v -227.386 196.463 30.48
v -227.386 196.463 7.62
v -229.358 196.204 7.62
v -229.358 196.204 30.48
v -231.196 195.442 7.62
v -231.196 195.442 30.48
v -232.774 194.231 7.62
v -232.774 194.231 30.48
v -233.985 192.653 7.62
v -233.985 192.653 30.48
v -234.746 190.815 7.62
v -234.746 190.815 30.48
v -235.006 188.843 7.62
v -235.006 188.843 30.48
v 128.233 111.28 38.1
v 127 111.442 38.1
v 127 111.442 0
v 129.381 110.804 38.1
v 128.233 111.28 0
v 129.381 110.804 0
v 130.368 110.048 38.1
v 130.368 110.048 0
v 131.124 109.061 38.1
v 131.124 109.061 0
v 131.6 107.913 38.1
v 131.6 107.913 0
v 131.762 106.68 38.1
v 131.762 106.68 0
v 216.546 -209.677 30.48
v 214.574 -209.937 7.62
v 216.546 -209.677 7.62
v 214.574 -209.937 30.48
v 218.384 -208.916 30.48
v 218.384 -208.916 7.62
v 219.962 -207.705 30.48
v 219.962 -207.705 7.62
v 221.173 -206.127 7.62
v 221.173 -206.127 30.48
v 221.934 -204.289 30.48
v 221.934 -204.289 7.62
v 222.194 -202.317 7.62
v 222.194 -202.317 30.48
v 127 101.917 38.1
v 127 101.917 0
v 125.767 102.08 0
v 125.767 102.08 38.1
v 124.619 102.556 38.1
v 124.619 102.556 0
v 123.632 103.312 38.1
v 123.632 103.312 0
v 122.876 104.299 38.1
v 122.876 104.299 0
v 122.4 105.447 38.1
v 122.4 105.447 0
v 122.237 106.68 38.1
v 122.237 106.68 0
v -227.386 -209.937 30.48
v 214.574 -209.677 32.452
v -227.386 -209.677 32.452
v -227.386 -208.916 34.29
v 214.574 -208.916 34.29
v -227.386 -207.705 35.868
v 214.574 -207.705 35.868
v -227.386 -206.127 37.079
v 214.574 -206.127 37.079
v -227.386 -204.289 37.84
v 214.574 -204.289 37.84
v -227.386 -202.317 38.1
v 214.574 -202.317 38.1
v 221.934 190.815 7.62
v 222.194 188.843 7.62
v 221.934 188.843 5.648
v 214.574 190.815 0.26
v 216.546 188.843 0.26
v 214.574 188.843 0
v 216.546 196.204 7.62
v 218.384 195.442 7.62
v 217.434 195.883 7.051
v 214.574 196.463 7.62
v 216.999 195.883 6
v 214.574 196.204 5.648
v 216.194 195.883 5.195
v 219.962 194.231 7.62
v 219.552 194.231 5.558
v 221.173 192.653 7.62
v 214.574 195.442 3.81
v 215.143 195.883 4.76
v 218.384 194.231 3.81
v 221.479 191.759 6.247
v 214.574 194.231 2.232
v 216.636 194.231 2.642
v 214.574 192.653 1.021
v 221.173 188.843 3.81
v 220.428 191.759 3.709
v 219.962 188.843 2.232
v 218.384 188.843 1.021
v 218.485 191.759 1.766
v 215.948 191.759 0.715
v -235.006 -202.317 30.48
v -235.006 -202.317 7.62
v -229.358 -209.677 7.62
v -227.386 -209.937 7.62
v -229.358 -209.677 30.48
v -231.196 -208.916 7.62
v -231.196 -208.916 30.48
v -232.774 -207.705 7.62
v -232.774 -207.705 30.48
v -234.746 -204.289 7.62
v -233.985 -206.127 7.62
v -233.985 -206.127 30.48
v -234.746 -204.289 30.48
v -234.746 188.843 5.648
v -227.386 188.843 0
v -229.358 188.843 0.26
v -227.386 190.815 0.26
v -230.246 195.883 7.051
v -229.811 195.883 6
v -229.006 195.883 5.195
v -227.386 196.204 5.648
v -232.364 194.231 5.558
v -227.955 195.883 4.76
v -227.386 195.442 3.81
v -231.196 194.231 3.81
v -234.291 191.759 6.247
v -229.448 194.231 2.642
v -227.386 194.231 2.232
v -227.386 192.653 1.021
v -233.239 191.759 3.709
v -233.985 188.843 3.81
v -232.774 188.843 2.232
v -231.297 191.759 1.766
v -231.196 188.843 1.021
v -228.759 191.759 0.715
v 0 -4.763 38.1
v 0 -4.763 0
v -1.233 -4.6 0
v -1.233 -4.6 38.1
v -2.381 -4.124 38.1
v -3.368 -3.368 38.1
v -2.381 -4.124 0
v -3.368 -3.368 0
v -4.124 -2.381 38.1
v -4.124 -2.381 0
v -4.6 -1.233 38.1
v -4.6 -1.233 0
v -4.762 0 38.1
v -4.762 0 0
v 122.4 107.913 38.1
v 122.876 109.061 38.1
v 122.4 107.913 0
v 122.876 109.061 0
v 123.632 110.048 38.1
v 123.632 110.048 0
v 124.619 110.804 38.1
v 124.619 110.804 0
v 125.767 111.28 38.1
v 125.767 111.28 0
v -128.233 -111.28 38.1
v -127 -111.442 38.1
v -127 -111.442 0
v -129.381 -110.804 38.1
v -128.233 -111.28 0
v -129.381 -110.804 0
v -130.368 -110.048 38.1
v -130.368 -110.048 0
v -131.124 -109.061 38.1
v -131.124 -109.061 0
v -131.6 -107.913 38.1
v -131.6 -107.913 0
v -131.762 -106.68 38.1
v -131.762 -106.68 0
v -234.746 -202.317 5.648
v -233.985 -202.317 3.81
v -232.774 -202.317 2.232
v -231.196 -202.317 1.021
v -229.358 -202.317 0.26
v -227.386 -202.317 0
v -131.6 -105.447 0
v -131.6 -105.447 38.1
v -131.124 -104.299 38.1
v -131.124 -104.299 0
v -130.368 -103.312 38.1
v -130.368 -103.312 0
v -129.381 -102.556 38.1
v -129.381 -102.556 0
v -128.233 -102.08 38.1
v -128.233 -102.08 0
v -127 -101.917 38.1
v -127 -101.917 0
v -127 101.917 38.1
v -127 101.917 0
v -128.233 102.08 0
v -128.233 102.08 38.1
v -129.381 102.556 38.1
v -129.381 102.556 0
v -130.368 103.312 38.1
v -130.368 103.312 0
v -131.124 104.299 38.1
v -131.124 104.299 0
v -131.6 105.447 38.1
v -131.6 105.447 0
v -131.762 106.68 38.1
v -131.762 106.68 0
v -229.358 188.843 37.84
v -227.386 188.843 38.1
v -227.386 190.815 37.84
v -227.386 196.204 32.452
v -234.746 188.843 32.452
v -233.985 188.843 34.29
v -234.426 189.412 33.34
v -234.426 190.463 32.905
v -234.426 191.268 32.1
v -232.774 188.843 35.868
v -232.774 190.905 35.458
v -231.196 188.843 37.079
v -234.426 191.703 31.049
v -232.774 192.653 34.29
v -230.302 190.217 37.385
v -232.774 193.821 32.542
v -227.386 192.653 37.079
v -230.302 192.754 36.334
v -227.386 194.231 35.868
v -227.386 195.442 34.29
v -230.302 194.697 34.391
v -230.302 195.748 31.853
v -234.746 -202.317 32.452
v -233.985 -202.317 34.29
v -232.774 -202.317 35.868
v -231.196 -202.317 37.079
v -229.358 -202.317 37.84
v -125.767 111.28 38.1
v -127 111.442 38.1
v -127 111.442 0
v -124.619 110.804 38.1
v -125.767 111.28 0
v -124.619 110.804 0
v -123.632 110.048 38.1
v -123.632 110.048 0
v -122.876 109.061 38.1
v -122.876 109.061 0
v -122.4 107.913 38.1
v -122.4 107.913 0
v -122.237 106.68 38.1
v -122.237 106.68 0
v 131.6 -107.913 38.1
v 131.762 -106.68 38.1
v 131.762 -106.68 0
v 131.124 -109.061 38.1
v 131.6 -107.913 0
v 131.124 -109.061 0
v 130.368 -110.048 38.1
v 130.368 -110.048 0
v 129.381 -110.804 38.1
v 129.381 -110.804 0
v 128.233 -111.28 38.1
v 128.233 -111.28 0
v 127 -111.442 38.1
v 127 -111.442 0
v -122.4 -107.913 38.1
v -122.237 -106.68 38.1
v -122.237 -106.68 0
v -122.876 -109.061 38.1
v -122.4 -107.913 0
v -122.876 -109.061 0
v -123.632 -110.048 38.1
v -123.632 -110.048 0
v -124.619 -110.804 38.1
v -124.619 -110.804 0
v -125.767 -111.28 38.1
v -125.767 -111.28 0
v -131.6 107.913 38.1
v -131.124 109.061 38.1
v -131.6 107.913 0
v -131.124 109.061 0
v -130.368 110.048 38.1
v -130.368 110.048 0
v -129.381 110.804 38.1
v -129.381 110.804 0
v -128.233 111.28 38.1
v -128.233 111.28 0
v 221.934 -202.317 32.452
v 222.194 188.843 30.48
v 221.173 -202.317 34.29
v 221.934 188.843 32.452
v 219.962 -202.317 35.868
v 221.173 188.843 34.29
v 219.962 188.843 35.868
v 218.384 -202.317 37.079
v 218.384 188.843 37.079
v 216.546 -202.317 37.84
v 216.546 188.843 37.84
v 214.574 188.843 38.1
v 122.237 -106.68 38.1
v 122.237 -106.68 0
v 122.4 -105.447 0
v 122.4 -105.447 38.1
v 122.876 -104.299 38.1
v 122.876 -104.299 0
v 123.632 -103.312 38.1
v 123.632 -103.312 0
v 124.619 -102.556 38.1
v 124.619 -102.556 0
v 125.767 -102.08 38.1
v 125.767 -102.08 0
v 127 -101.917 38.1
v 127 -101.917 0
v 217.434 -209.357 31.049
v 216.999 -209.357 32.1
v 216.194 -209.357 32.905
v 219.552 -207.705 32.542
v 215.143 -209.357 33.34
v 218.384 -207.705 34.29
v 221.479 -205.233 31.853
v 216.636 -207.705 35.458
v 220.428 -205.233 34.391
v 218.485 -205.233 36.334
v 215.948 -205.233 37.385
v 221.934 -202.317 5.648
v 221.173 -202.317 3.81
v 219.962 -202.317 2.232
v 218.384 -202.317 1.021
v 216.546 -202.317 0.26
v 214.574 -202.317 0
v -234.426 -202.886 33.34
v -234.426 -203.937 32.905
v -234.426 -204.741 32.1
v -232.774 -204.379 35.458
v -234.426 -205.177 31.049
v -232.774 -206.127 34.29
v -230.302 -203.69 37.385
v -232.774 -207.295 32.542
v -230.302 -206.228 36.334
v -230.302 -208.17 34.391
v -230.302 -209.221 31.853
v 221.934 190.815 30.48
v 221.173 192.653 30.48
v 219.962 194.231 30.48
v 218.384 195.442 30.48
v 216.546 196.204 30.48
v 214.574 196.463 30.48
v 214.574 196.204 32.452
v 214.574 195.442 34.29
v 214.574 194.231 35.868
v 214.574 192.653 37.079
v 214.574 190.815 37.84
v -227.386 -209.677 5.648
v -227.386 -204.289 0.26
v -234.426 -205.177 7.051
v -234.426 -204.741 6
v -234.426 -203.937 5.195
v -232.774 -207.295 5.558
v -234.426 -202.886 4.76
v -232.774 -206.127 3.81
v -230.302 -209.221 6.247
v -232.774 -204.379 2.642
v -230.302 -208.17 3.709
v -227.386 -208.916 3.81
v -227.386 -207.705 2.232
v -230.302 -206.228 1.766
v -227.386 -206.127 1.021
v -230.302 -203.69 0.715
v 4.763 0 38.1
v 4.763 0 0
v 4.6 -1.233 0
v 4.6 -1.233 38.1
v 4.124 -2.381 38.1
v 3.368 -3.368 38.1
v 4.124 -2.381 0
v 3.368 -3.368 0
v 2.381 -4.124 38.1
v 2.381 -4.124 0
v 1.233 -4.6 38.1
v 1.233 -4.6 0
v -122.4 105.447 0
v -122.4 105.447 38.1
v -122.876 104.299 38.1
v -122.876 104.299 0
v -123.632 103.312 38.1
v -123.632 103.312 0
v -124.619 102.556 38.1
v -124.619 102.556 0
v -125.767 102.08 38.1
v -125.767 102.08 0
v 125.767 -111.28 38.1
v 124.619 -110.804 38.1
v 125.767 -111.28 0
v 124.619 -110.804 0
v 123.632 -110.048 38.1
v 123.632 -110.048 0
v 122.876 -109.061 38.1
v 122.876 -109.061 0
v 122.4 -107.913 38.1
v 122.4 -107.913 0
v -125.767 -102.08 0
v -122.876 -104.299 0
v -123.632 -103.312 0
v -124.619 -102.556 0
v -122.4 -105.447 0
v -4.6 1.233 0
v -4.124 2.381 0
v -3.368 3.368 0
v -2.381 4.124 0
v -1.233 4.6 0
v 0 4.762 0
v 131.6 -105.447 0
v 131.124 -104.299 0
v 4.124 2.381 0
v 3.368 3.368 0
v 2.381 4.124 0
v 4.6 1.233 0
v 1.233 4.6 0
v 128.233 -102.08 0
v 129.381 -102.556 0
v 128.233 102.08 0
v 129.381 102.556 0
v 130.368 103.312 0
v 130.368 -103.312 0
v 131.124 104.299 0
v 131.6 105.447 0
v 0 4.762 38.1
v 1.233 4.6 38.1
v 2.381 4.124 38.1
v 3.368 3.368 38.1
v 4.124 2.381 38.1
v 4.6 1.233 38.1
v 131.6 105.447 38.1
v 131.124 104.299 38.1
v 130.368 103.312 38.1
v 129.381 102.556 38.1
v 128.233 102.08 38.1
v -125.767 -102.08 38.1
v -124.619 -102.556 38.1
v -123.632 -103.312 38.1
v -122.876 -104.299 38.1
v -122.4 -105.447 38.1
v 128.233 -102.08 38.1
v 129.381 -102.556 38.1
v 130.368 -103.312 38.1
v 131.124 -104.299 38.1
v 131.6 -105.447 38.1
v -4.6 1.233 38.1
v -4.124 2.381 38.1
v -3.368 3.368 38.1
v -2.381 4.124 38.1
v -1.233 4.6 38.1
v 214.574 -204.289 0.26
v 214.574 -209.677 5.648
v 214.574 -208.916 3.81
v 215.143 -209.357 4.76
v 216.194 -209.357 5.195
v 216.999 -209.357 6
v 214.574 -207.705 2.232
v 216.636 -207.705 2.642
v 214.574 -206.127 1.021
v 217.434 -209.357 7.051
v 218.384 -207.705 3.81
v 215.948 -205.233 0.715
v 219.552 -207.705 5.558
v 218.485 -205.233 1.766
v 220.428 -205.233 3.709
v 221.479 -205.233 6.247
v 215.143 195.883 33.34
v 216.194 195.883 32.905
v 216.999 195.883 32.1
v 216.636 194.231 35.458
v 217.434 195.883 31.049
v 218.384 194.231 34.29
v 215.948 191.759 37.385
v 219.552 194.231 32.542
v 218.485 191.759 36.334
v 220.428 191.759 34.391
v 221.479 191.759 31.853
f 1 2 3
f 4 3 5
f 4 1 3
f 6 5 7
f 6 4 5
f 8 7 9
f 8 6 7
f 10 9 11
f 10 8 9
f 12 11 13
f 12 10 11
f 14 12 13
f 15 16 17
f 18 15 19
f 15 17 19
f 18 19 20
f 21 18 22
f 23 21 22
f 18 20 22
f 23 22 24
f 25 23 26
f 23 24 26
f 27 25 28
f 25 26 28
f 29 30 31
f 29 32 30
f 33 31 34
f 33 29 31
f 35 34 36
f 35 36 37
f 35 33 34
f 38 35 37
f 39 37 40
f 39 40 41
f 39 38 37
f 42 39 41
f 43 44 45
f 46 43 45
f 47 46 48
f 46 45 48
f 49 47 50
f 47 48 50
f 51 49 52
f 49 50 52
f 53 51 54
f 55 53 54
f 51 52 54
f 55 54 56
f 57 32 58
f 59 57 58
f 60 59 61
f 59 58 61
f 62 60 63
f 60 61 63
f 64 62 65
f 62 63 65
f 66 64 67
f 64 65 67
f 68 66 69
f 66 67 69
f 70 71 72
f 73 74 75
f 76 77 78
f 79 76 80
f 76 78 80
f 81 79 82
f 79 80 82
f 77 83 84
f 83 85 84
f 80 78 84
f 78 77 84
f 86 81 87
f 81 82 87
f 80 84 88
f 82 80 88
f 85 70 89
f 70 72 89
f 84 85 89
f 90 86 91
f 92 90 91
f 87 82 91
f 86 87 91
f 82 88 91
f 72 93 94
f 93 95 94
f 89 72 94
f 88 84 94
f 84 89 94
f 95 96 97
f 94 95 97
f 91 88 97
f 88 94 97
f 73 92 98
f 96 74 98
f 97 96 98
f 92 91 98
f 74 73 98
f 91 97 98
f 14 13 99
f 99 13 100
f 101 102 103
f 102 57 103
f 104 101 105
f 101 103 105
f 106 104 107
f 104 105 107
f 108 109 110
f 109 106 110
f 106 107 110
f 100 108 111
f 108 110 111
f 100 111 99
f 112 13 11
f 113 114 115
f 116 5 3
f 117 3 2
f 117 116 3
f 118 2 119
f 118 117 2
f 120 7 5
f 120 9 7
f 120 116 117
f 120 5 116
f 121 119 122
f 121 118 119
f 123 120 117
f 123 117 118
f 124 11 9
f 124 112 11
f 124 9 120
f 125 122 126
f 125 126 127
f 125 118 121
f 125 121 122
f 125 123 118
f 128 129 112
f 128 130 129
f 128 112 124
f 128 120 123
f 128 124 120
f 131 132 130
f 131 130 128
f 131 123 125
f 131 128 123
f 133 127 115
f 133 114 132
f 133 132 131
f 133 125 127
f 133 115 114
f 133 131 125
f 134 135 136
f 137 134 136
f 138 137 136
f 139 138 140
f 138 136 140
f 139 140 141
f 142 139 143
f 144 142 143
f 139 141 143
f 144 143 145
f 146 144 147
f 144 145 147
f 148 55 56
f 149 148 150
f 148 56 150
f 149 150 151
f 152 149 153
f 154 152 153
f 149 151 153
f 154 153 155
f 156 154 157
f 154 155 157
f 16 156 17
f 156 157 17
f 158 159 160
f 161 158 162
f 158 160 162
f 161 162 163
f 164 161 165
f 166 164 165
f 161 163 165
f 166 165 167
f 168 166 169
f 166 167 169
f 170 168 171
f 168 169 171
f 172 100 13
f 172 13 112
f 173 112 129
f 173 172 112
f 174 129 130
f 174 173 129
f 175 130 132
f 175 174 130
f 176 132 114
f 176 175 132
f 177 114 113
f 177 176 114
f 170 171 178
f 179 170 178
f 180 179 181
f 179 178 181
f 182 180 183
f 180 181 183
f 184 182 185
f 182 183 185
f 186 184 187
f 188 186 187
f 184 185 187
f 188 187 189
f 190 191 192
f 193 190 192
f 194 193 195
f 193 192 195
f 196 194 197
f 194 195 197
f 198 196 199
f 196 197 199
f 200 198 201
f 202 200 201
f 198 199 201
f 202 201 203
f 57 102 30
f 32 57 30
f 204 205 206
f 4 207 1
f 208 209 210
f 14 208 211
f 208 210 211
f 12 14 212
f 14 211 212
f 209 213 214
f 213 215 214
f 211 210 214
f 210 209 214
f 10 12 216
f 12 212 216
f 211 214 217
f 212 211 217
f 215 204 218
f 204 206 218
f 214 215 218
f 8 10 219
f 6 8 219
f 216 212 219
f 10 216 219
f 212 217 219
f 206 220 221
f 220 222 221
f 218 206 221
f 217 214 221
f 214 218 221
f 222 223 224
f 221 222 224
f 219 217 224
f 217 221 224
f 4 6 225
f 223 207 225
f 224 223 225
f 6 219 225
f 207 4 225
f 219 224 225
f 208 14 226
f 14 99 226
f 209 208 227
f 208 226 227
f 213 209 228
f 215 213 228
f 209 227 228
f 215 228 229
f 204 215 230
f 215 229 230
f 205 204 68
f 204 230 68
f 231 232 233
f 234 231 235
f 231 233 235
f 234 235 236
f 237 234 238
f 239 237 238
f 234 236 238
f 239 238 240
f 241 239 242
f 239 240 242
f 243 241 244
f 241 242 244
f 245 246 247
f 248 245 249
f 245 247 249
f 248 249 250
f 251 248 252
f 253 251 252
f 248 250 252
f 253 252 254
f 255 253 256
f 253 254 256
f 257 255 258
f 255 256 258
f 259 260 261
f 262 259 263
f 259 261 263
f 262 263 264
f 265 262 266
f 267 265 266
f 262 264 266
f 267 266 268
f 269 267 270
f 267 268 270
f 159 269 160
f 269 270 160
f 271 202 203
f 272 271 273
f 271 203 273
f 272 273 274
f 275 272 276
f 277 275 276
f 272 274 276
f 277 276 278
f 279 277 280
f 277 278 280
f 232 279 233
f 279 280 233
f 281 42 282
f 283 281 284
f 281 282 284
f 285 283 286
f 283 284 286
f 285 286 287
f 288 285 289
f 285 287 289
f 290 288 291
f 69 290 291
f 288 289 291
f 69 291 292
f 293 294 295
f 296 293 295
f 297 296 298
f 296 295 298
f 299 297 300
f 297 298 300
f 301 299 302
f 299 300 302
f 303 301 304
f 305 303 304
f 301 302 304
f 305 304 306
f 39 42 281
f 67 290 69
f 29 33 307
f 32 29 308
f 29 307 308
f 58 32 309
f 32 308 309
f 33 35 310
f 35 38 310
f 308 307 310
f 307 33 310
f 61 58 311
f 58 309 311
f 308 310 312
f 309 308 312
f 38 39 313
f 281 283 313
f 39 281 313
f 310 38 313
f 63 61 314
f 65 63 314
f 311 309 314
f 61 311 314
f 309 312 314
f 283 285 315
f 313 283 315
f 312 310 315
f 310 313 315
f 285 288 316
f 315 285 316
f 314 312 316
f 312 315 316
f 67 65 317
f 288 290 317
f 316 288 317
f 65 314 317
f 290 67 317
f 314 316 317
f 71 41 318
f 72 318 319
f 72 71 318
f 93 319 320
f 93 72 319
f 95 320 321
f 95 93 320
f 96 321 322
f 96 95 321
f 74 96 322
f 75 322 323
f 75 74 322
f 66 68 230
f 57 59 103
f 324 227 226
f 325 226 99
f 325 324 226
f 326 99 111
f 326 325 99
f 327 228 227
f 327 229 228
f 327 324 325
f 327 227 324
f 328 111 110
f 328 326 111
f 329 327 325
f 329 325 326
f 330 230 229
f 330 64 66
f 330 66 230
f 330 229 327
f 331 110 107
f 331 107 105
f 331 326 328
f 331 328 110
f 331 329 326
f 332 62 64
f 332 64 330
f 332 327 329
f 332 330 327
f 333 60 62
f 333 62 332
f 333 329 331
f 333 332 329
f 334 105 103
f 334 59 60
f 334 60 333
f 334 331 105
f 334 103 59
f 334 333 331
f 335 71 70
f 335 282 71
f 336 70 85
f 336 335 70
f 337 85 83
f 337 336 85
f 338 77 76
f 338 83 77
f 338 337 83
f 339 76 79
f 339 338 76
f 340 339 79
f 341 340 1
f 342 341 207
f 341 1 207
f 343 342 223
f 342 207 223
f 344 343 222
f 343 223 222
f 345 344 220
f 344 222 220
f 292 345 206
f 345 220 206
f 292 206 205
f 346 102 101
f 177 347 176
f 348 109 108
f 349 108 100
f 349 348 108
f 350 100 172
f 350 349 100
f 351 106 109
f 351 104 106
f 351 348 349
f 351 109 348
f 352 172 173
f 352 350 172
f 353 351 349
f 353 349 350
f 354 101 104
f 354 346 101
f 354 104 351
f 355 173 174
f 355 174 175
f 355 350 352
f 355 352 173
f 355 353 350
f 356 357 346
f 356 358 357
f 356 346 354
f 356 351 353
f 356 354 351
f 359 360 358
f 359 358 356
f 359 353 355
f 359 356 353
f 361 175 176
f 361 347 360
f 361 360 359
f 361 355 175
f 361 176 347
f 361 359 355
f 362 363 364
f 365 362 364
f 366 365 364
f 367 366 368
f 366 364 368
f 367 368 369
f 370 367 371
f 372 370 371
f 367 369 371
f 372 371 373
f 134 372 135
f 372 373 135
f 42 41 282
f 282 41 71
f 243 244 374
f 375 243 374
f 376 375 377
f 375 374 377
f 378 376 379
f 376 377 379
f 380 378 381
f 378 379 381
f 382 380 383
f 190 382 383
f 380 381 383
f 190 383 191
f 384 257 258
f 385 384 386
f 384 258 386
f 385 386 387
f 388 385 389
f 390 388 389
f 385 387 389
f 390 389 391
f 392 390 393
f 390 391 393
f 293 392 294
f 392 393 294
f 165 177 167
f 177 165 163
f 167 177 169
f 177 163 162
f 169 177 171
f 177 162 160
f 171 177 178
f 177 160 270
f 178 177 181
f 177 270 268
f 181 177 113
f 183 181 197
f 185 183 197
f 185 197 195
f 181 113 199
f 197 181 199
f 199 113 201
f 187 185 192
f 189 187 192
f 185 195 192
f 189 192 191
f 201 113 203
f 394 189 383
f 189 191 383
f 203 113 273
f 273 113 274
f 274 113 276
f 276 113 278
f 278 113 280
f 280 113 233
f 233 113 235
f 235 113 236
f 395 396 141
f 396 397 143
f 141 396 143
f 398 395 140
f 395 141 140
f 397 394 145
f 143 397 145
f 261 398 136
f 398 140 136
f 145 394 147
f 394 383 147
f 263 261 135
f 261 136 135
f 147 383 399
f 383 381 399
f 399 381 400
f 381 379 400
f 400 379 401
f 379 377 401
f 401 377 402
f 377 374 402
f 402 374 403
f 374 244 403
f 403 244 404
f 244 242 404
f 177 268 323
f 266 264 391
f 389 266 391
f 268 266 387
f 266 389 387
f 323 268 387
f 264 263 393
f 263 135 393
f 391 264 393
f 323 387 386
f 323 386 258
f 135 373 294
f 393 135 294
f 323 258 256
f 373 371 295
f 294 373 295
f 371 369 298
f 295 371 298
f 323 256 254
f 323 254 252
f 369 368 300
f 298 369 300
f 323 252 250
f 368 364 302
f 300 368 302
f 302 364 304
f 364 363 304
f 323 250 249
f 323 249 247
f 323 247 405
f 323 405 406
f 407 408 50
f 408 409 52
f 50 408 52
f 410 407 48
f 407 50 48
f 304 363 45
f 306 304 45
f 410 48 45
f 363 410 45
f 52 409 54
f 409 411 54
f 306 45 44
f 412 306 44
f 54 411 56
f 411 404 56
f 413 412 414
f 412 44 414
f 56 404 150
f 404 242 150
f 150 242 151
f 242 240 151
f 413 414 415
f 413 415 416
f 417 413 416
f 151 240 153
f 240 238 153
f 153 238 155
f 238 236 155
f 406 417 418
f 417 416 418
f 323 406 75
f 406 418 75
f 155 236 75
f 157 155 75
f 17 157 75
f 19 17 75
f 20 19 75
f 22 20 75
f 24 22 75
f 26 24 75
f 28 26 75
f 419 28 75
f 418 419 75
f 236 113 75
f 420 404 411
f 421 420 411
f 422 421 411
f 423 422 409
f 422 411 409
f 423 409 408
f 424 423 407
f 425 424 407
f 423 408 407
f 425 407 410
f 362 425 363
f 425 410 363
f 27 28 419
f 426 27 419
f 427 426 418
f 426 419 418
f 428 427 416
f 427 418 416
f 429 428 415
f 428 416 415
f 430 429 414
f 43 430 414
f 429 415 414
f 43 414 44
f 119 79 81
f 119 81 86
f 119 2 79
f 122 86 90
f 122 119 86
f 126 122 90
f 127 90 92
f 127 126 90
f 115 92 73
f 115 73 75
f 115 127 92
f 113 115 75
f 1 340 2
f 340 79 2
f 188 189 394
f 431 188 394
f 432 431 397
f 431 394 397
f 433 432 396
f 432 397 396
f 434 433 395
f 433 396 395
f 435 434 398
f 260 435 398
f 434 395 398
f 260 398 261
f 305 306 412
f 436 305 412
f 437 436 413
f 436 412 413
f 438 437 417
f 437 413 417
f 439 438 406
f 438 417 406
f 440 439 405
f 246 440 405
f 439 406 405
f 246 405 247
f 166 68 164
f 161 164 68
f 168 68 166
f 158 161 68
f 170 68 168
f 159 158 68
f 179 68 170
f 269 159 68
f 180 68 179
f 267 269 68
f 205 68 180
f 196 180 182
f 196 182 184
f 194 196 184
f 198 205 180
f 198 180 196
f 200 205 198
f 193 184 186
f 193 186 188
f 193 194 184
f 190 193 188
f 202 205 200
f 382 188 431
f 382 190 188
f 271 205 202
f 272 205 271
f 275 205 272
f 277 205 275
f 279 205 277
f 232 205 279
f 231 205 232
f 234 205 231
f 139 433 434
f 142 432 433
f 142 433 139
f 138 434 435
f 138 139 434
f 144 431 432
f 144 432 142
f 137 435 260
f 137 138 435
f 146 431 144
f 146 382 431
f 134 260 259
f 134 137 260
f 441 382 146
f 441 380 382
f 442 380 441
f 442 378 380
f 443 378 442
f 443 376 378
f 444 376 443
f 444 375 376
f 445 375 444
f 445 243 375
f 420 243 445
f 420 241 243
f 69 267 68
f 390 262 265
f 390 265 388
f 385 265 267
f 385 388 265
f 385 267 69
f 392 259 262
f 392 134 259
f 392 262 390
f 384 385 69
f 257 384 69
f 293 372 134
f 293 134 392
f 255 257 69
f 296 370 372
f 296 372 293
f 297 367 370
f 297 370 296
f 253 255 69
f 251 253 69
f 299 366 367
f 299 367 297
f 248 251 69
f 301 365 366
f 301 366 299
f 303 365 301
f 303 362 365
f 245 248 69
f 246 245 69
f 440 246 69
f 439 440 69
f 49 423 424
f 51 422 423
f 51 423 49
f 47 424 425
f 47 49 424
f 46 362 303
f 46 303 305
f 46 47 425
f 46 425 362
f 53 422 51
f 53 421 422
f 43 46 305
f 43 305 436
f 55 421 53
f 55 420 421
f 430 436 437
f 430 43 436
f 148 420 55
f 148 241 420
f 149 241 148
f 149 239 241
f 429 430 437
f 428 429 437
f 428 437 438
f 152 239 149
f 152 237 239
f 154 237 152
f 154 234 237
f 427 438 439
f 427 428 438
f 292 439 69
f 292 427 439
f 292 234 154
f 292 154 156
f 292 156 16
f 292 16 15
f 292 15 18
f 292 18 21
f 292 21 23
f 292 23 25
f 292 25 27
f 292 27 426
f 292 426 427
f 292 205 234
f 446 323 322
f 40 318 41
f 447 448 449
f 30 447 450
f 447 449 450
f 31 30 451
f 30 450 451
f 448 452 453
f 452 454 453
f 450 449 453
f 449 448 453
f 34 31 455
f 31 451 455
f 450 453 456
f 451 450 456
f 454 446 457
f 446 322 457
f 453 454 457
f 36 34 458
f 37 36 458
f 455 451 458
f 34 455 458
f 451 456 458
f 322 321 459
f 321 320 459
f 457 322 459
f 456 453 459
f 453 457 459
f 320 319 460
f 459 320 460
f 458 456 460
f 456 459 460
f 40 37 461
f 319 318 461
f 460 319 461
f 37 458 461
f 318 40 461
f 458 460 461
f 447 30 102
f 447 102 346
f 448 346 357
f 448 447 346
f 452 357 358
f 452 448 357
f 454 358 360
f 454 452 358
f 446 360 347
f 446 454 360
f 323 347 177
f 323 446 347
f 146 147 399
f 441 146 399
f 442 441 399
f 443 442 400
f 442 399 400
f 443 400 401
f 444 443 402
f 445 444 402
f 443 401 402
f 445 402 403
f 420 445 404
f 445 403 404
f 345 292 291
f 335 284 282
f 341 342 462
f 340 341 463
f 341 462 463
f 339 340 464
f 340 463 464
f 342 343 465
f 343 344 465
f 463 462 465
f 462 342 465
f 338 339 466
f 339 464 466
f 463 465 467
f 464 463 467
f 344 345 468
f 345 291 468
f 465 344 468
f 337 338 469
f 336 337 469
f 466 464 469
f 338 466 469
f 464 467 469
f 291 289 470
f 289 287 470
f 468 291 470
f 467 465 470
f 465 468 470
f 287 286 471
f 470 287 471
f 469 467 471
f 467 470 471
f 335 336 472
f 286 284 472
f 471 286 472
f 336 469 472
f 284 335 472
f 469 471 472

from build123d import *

# Parameters (mm, degrees)
F1_DEPTH = 38.1
F2_R     = 7.62


with BuildPart() as f1:
    # F0 (on Top) → F1 (new body)
    with BuildSketch(Plane.XY):
        with BuildLine():
            Line((-131.7625, -106.68), (-235.0059007668, -106.68))
            Line((-235.0059007668, -106.68), (-235.0059007668, -209.9367127657))
            Line((-235.0059007668, -209.9367127657), (-127, -209.9367127657))
            Line((-127, -209.9367127657), (-127, -111.4425))
            ThreePointArc((-127, -111.4425), (-130.3675960454, -110.0475960454), (-131.7625, -106.68))
        make_face()
        with BuildLine():
            Line((-127, -111.4425), (-127, -209.9367127657))
            Line((-127, -209.9367127657), (0, -209.9367127657))
            Line((0, -209.9367127657), (0, -106.68))
            Line((0, -106.68), (-122.2375, -106.68))
            ThreePointArc((-122.2375, -106.68), (-123.6324039546, -110.0475960454), (-127, -111.4425))
        make_face()
        with BuildLine():
            Line((-4.7625, 0), (-127, 0))
            Line((-127, 0), (-127, -101.9175))
            ThreePointArc((-127, -101.9175), (-123.6324039546, -103.3124039546), (-122.2375, -106.68))
            Line((-122.2375, -106.68), (0, -106.68))
            Line((0, -106.68), (0, -4.7625))
            ThreePointArc((0, -4.7625), (-3.3675960454, -3.3675960454), (-4.7625, 0))
        make_face()
        with BuildLine():
            Line((-127, 0), (-235.0059007668, 0))
            Line((-235.0059007668, 0), (-235.0059007668, -106.68))
            Line((-235.0059007668, -106.68), (-131.7625, -106.68))
            ThreePointArc((-131.7625, -106.68), (-130.3675960454, -103.3124039546), (-127, -101.9175))
            Line((-127, -101.9175), (-127, 0))
        make_face()
        with BuildLine():
            Line((-131.7625, 106.68), (-235.0059007668, 106.68))
            Line((-235.0059007668, 106.68), (-235.0059007668, 0))
            Line((-235.0059007668, 0), (-127, 0))
            Line((-127, 0), (-127, 101.9175))
            ThreePointArc((-127, 101.9175), (-130.3675960454, 103.3124039546), (-131.7625, 106.68))
        make_face()
        with BuildLine():
            Line((0, 4.7625), (0, 106.68))
            Line((0, 106.68), (-122.2375, 106.68))
            ThreePointArc((-122.2375, 106.68), (-123.6324039546, 103.3124039546), (-127, 101.9175))
            Line((-127, 101.9175), (-127, 0))
            Line((-127, 0), (-4.7625, 0))
            ThreePointArc((-4.7625, 0), (-3.3675960454, 3.3675960454), (0, 4.7625))
        make_face()
        with BuildLine():
            Line((0, 196.4632872343), (-127, 196.4632872343))
            Line((-127, 196.4632872343), (-127, 111.4425))
            ThreePointArc((-127, 111.4425), (-123.6324039546, 110.0475960454), (-122.2375, 106.68))
            Line((-122.2375, 106.68), (0, 106.68))
            Line((0, 106.68), (0, 196.4632872343))
        make_face()
        with BuildLine():
            Line((-127, 196.4632872343), (-235.0059007668, 196.4632872343))
            Line((-235.0059007668, 196.4632872343), (-235.0059007668, 106.68))
            Line((-235.0059007668, 106.68), (-131.7625, 106.68))
            ThreePointArc((-131.7625, 106.68), (-130.3675960454, 110.0475960454), (-127, 111.4425))
            Line((-127, 111.4425), (-127, 196.4632872343))
        make_face()
        with BuildLine():
            Line((222.1940992332, 196.4632872343), (127, 196.4632872343))
            Line((127, 196.4632872343), (127, 111.4425))
            ThreePointArc((127, 111.4425), (130.3675960454, 110.0475960454), (131.7625, 106.68))
            Line((131.7625, 106.68), (222.1940992332, 106.68))
            Line((222.1940992332, 106.68), (222.1940992332, 196.4632872343))
        make_face()
        with BuildLine():
            Line((127, 196.4632872343), (0, 196.4632872343))
            Line((0, 196.4632872343), (0, 106.68))
            Line((0, 106.68), (122.2375, 106.68))
            ThreePointArc((122.2375, 106.68), (123.6324039546, 110.0475960454), (127, 111.4425))
            Line((127, 111.4425), (127, 196.4632872343))
        make_face()
        with BuildLine():
            Line((122.2375, 106.68), (0, 106.68))
            Line((0, 106.68), (0, 4.7625))
            ThreePointArc((0, 4.7625), (3.3675960454, 3.3675960454), (4.7625, 0))
            Line((4.7625, 0), (127, 0))
            Line((127, 0), (127, 101.9175))
            ThreePointArc((127, 101.9175), (123.6324039546, 103.3124039546), (122.2375, 106.68))
        make_face()
        with BuildLine():
            Line((222.1940992332, 0), (222.1940992332, 106.68))
            Line((222.1940992332, 106.68), (131.7625, 106.68))
            ThreePointArc((131.7625, 106.68), (130.3675960454, 103.3124039546), (127, 101.9175))
            Line((127, 101.9175), (127, 0))
            Line((127, 0), (222.1940992332, 0))
        make_face()
        with BuildLine():
            Line((127, 0), (4.7625, 0))
            ThreePointArc((4.7625, 0), (3.3675960454, -3.3675960454), (0, -4.7625))
            Line((0, -4.7625), (0, -106.68))
            Line((0, -106.68), (122.2375, -106.68))
            ThreePointArc((122.2375, -106.68), (123.6324039546, -103.3124039546), (127, -101.9175))
            Line((127, -101.9175), (127, 0))
        make_face()
        with BuildLine():
            Line((222.1940992332, -106.68), (222.1940992332, 0))
            Line((222.1940992332, 0), (127, 0))
            Line((127, 0), (127, -101.9175))
            ThreePointArc((127, -101.9175), (130.3675960454, -103.3124039546), (131.7625, -106.68))
            Line((131.7625, -106.68), (222.1940992332, -106.68))
        make_face()
        with BuildLine():
            Line((0, -106.68), (0, -209.9367127657))
            Line((0, -209.9367127657), (127, -209.9367127657))
            Line((127, -209.9367127657), (127, -111.4425))
            ThreePointArc((127, -111.4425), (123.6324039546, -110.0475960454), (122.2375, -106.68))
            Line((122.2375, -106.68), (0, -106.68))
        make_face()
        with BuildLine():
            Line((222.1940992332, -209.9367127657), (222.1940992332, -106.68))
            Line((222.1940992332, -106.68), (131.7625, -106.68))
            ThreePointArc((131.7625, -106.68), (130.3675960454, -110.0475960454), (127, -111.4425))
            Line((127, -111.4425), (127, -209.9367127657))
            Line((127, -209.9367127657), (222.1940992332, -209.9367127657))
        make_face()
    extrude(amount=F1_DEPTH)

    # F2
    f2_edges = [f1.edges().sort_by_distance(p)[0] for p in [
        (222.194099, -6.736713, 38.1),
        (222.194099, -6.736713, 0),
        (-6.405901, -209.936713, 0),
        (222.194099, -209.936713, 19.05),
        (-6.405901, -209.936713, 38.1),
        (-6.405901, 196.463287, 38.1),
        (222.194099, 196.463287, 19.05),
        (-235.005901, -6.736713, 38.1),
        (-235.005901, -209.936713, 19.05),
        (-235.005901, -6.736713, 0),
        (-235.005901, 196.463287, 19.05),
        (-6.405901, 196.463287, 0),
    ]]
    fillet(f2_edges, radius=F2_R)


solid = f1.part
